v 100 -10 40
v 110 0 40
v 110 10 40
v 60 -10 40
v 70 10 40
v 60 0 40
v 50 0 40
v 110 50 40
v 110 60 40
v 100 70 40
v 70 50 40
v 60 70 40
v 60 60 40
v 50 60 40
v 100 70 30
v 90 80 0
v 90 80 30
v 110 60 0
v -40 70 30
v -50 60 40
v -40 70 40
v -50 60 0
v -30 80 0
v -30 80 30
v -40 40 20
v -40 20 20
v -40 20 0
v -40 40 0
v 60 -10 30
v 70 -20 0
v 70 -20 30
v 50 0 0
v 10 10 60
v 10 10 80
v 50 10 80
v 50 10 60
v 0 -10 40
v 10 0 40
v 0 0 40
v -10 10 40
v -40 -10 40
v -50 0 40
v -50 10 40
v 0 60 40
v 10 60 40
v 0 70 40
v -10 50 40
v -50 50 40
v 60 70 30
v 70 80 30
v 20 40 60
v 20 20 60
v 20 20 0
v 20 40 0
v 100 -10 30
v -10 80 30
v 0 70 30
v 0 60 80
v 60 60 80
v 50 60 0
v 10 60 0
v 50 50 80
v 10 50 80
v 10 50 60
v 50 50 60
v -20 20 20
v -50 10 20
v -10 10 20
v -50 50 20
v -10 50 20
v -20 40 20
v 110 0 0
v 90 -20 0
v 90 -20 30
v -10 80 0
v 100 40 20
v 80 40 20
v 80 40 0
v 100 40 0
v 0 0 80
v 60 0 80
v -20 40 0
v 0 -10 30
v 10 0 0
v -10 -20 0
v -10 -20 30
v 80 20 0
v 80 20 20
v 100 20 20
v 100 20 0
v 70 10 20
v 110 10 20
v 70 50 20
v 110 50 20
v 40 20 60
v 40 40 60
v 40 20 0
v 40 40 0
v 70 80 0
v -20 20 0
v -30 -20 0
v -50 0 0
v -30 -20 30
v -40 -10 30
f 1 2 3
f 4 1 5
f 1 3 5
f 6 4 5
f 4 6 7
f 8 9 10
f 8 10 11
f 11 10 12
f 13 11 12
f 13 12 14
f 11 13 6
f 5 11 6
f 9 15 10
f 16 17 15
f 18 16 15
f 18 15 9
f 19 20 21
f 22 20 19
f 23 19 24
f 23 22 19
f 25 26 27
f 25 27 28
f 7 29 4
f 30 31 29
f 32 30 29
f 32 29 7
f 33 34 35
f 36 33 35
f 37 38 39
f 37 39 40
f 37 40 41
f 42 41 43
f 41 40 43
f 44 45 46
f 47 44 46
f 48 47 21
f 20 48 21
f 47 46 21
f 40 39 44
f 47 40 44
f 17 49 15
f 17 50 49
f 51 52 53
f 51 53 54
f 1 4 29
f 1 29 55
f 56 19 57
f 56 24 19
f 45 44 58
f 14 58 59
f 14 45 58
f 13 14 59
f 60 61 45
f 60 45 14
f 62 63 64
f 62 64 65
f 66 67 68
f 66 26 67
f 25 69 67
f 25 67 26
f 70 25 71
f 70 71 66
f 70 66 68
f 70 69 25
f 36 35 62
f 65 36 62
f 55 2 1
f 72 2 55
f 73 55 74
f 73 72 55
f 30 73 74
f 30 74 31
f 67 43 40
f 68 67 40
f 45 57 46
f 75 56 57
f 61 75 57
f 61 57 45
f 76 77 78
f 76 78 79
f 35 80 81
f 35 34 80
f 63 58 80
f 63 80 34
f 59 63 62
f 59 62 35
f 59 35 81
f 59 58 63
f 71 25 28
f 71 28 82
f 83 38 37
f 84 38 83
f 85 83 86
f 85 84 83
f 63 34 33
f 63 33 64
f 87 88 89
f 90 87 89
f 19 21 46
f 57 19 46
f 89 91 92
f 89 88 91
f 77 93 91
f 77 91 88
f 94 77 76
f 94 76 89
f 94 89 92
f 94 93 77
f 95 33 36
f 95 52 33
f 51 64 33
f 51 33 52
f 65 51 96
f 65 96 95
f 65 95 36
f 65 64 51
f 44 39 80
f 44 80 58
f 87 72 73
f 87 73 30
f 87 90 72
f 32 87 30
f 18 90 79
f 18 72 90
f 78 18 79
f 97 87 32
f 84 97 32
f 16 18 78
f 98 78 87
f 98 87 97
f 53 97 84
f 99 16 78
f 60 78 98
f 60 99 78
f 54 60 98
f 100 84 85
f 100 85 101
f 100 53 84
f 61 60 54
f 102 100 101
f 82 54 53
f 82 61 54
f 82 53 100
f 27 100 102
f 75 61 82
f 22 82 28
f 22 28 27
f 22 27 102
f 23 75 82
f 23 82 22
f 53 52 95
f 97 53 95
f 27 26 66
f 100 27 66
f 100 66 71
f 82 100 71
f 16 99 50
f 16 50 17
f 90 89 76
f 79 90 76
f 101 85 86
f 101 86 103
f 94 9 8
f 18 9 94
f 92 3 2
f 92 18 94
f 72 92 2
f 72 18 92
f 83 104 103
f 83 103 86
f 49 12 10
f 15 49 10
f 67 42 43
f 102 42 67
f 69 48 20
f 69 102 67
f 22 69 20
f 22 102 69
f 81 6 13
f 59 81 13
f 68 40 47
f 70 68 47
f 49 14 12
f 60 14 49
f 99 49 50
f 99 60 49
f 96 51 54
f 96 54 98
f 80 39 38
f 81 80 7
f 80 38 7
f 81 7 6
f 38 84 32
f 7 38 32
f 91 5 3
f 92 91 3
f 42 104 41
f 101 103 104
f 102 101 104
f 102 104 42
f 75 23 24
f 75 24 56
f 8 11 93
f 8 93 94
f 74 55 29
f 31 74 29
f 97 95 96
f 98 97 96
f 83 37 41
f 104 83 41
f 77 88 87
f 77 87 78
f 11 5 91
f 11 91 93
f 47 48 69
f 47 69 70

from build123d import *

# Parameters (mm, degrees)
SKETCH1_W           = 60
SKETCH1_H           = 60
BOSS_EXTRUDE1_DEPTH = 80
SKETCH2_W           = 40
SKETCH2_H           = 40
CUT_EXTRUDE1_DEPTH  = 20
SKETCH3_W           = 20
SKETCH3_H           = 20
CUT_EXTRUDE2_DEPTH  = 136
BOSS_EXTRUDE2_DEPTH = 40
CUT_EXTRUDE3_DEPTH  = 10
SKETCH7_W           = 40
SKETCH7_H           = 40
CUT_EXTRUDE4_DEPTH  = 20
SKETCH8_W           = 20
SKETCH8_H           = 20
CUT_EXTRUDE5_DEPTH  = 20
BOSS_EXTRUDE3_DEPTH = 40
CUT_EXTRUDE6_DEPTH  = 10
SKETCH11_W          = 40
SKETCH11_H          = 40
CUT_EXTRUDE7_DEPTH  = 20
SKETCH12_W          = 20
SKETCH12_H          = 20
CUT_EXTRUDE8_DEPTH  = 20


with BuildPart() as part:
    # Sketch1 → Boss-Extrude1 (new body)
    with BuildSketch(Plane.XY):
        with Locations((30, 30)):
            Rectangle(SKETCH1_W, SKETCH1_H)
    extrude(amount=BOSS_EXTRUDE1_DEPTH)

    # Sketch2 → Cut-Extrude1 (cut)
    with BuildSketch(Plane.XY.offset(80)):
        with Locations((30, 30)):
            Rectangle(SKETCH2_W, SKETCH2_H)
    extrude(amount=-CUT_EXTRUDE1_DEPTH, mode=Mode.SUBTRACT)

    # Sketch3 → Cut-Extrude2 (cut)
    with BuildSketch(Plane.XY.offset(60)):
        with Locations((30, 30)):
            Rectangle(SKETCH3_W, SKETCH3_H)
    extrude(amount=-CUT_EXTRUDE2_DEPTH, mode=Mode.SUBTRACT)

    # Sketch5 → Boss-Extrude2 (add)
    with BuildSketch(Plane(origin=(0, 0, 0), x_dir=(-1, 0, 0), z_dir=(0, 0, -1))):
        Polygon((10, 80), (-10, 60), (0, 60), (0, 0), (-10, 0), (10, -20), (30, -20), (50, 0), (50, 60), (30, 80), align=None)
    extrude(amount=-BOSS_EXTRUDE2_DEPTH)

    # Sketch6 → Cut-Extrude3 (cut)
    with BuildSketch(Plane.XY.offset(40)):
        Polygon((-40, 70), (0, 70), (-10, 80), (-30, 80), align=None)
        Polygon((0, -10), (-40, -10), (-30, -20), (-10, -20), align=None)
    extrude(amount=-CUT_EXTRUDE3_DEPTH, mode=Mode.SUBTRACT)

    # Sketch7 → Cut-Extrude4 (cut)
    with BuildSketch(Plane.XY.offset(40)):
        with Locations((-30, 30)):
            Rectangle(SKETCH7_W, SKETCH7_H)
    extrude(amount=-CUT_EXTRUDE4_DEPTH, mode=Mode.SUBTRACT)

    # Sketch8 → Cut-Extrude5 (cut)
    with BuildSketch(Plane.XY.offset(20)):
        with Locations((-30, 30)):
            Rectangle(SKETCH8_W, SKETCH8_H)
    extrude(amount=-CUT_EXTRUDE5_DEPTH, mode=Mode.SUBTRACT)

    # Sketch9 → Boss-Extrude3 (add)
    with BuildSketch(Plane(origin=(0, 0, 0), x_dir=(-1, 0, 0), z_dir=(0, 0, -1))):
        Polygon((-50, 60), (-70, 80), (-90, 80), (-110, 60), (-110, 0), (-90, -20), (-70, -20), (-50, 0), (-60, 0), (-60, 60), align=None)
    extrude(amount=-BOSS_EXTRUDE3_DEPTH)

    # Sketch10 → Cut-Extrude6 (cut)
    with BuildSketch(Plane.XY.offset(40)):
        Polygon((60, 70), (100, 70), (90, 80), (70, 80), align=None)
        Polygon((60, -10), (100, -10), (90, -20), (70, -20), align=None)
    extrude(amount=-CUT_EXTRUDE6_DEPTH, mode=Mode.SUBTRACT)

    # Sketch11 → Cut-Extrude7 (cut)
    with BuildSketch(Plane.XY.offset(40)):
        with Locations((90, 30)):
            Rectangle(SKETCH11_W, SKETCH11_H)
    extrude(amount=-CUT_EXTRUDE7_DEPTH, mode=Mode.SUBTRACT)

    # Sketch12 → Cut-Extrude8 (cut)
    with BuildSketch(Plane.XY.offset(20)):
        with Locations((90, 30)):
            Rectangle(SKETCH12_W, SKETCH12_H)
    extrude(amount=-CUT_EXTRUDE8_DEPTH, mode=Mode.SUBTRACT)


solid = part.part
